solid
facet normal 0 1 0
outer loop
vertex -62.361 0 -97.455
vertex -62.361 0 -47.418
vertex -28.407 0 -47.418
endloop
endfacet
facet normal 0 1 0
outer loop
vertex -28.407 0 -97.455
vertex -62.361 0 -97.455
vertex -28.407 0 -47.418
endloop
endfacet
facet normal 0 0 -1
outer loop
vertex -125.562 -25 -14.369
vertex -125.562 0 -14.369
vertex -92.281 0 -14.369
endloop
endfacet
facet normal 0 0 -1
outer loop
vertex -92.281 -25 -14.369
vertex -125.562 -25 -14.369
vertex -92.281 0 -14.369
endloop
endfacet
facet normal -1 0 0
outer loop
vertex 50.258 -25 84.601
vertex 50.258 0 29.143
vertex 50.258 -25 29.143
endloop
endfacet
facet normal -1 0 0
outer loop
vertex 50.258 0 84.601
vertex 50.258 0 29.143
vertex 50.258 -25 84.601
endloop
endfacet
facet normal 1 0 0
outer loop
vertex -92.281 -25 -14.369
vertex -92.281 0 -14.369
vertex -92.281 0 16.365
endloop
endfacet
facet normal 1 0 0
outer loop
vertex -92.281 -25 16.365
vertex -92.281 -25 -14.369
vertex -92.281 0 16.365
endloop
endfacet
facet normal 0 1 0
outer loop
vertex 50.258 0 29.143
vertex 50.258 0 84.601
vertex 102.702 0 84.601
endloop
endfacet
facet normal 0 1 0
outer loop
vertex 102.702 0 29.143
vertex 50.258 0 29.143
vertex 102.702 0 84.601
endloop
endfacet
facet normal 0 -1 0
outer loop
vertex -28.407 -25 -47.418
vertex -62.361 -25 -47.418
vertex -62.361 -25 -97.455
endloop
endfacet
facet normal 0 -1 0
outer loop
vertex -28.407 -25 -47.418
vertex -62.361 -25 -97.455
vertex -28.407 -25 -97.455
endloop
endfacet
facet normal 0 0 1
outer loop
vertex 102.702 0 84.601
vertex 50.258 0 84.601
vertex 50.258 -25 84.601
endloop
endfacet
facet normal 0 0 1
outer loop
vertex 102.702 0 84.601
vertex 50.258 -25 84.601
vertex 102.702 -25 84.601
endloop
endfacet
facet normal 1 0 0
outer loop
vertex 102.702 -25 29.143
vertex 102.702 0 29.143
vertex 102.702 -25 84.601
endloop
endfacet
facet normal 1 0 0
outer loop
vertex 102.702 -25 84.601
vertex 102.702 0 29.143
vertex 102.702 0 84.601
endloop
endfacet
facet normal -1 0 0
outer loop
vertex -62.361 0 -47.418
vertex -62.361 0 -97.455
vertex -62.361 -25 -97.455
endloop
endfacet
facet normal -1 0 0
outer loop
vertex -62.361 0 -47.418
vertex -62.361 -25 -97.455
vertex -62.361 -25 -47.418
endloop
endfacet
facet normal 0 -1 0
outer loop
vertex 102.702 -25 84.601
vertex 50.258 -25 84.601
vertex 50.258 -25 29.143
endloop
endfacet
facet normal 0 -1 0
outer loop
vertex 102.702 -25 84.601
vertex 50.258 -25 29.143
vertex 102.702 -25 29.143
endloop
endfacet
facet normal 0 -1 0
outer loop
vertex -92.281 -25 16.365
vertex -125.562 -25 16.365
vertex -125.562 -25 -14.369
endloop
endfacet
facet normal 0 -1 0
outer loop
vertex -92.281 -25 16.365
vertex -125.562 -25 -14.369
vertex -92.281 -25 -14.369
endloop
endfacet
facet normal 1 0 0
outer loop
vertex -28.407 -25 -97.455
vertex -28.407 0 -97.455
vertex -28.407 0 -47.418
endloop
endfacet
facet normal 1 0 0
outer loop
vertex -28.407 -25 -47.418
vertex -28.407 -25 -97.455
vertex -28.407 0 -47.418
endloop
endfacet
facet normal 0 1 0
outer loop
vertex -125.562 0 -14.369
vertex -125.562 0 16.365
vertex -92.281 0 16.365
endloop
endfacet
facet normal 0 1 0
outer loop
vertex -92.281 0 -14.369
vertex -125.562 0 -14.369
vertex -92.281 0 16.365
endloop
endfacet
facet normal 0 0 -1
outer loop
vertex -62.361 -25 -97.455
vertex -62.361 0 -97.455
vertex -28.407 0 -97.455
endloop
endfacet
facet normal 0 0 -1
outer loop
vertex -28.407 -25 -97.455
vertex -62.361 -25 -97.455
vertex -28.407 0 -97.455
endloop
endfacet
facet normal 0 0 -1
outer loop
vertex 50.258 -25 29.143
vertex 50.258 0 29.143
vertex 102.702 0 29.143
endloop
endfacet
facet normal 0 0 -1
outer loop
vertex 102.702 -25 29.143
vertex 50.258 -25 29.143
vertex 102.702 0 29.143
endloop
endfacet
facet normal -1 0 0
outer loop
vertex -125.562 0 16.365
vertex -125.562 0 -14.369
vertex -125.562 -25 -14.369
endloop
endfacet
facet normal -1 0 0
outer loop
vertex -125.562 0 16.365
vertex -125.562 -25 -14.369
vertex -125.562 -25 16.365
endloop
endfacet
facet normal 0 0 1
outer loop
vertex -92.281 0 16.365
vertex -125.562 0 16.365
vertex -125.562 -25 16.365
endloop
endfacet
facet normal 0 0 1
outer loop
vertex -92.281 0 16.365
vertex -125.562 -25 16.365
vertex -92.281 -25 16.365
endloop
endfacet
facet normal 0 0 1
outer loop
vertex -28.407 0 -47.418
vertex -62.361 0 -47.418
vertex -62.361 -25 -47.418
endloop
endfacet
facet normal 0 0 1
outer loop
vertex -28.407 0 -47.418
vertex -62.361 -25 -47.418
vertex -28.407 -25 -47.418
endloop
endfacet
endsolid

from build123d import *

# Parameters (mm, degrees)
F0_W     = 33.281528
F0_H     = 30.733693
F1_DEPTH = 25
F0_W_2   = 33.953875
F0_H_2   = 50.037868
F2_DEPTH = 25
F0_W_3   = 52.443616
F0_H_3   = 55.458013
F3_DEPTH = 25


with BuildPart() as f1:
    # F0 (on Front) → F1 (new body)
    with BuildSketch(Plane.XZ):
        with Locations((-108.921353, 0.998195)):
            Rectangle(F0_W, F0_H)
    extrude(amount=F1_DEPTH)


with BuildPart() as f2:
    # F0 (on Front) → F2 (new body)
    with BuildSketch(Plane.XZ):
        with Locations((-45.383896, -72.436448)):
            Rectangle(F0_W_2, F0_H_2)
    extrude(amount=F2_DEPTH)


with BuildPart() as f3:
    # F0 (on Front) → F3 (new body)
    with BuildSketch(Plane.XZ):
        with Locations((76.480273, 56.872276)):
            Rectangle(F0_W_3, F0_H_3)
    extrude(amount=F3_DEPTH)


solid = Compound([f1.part, f2.part, f3.part])
